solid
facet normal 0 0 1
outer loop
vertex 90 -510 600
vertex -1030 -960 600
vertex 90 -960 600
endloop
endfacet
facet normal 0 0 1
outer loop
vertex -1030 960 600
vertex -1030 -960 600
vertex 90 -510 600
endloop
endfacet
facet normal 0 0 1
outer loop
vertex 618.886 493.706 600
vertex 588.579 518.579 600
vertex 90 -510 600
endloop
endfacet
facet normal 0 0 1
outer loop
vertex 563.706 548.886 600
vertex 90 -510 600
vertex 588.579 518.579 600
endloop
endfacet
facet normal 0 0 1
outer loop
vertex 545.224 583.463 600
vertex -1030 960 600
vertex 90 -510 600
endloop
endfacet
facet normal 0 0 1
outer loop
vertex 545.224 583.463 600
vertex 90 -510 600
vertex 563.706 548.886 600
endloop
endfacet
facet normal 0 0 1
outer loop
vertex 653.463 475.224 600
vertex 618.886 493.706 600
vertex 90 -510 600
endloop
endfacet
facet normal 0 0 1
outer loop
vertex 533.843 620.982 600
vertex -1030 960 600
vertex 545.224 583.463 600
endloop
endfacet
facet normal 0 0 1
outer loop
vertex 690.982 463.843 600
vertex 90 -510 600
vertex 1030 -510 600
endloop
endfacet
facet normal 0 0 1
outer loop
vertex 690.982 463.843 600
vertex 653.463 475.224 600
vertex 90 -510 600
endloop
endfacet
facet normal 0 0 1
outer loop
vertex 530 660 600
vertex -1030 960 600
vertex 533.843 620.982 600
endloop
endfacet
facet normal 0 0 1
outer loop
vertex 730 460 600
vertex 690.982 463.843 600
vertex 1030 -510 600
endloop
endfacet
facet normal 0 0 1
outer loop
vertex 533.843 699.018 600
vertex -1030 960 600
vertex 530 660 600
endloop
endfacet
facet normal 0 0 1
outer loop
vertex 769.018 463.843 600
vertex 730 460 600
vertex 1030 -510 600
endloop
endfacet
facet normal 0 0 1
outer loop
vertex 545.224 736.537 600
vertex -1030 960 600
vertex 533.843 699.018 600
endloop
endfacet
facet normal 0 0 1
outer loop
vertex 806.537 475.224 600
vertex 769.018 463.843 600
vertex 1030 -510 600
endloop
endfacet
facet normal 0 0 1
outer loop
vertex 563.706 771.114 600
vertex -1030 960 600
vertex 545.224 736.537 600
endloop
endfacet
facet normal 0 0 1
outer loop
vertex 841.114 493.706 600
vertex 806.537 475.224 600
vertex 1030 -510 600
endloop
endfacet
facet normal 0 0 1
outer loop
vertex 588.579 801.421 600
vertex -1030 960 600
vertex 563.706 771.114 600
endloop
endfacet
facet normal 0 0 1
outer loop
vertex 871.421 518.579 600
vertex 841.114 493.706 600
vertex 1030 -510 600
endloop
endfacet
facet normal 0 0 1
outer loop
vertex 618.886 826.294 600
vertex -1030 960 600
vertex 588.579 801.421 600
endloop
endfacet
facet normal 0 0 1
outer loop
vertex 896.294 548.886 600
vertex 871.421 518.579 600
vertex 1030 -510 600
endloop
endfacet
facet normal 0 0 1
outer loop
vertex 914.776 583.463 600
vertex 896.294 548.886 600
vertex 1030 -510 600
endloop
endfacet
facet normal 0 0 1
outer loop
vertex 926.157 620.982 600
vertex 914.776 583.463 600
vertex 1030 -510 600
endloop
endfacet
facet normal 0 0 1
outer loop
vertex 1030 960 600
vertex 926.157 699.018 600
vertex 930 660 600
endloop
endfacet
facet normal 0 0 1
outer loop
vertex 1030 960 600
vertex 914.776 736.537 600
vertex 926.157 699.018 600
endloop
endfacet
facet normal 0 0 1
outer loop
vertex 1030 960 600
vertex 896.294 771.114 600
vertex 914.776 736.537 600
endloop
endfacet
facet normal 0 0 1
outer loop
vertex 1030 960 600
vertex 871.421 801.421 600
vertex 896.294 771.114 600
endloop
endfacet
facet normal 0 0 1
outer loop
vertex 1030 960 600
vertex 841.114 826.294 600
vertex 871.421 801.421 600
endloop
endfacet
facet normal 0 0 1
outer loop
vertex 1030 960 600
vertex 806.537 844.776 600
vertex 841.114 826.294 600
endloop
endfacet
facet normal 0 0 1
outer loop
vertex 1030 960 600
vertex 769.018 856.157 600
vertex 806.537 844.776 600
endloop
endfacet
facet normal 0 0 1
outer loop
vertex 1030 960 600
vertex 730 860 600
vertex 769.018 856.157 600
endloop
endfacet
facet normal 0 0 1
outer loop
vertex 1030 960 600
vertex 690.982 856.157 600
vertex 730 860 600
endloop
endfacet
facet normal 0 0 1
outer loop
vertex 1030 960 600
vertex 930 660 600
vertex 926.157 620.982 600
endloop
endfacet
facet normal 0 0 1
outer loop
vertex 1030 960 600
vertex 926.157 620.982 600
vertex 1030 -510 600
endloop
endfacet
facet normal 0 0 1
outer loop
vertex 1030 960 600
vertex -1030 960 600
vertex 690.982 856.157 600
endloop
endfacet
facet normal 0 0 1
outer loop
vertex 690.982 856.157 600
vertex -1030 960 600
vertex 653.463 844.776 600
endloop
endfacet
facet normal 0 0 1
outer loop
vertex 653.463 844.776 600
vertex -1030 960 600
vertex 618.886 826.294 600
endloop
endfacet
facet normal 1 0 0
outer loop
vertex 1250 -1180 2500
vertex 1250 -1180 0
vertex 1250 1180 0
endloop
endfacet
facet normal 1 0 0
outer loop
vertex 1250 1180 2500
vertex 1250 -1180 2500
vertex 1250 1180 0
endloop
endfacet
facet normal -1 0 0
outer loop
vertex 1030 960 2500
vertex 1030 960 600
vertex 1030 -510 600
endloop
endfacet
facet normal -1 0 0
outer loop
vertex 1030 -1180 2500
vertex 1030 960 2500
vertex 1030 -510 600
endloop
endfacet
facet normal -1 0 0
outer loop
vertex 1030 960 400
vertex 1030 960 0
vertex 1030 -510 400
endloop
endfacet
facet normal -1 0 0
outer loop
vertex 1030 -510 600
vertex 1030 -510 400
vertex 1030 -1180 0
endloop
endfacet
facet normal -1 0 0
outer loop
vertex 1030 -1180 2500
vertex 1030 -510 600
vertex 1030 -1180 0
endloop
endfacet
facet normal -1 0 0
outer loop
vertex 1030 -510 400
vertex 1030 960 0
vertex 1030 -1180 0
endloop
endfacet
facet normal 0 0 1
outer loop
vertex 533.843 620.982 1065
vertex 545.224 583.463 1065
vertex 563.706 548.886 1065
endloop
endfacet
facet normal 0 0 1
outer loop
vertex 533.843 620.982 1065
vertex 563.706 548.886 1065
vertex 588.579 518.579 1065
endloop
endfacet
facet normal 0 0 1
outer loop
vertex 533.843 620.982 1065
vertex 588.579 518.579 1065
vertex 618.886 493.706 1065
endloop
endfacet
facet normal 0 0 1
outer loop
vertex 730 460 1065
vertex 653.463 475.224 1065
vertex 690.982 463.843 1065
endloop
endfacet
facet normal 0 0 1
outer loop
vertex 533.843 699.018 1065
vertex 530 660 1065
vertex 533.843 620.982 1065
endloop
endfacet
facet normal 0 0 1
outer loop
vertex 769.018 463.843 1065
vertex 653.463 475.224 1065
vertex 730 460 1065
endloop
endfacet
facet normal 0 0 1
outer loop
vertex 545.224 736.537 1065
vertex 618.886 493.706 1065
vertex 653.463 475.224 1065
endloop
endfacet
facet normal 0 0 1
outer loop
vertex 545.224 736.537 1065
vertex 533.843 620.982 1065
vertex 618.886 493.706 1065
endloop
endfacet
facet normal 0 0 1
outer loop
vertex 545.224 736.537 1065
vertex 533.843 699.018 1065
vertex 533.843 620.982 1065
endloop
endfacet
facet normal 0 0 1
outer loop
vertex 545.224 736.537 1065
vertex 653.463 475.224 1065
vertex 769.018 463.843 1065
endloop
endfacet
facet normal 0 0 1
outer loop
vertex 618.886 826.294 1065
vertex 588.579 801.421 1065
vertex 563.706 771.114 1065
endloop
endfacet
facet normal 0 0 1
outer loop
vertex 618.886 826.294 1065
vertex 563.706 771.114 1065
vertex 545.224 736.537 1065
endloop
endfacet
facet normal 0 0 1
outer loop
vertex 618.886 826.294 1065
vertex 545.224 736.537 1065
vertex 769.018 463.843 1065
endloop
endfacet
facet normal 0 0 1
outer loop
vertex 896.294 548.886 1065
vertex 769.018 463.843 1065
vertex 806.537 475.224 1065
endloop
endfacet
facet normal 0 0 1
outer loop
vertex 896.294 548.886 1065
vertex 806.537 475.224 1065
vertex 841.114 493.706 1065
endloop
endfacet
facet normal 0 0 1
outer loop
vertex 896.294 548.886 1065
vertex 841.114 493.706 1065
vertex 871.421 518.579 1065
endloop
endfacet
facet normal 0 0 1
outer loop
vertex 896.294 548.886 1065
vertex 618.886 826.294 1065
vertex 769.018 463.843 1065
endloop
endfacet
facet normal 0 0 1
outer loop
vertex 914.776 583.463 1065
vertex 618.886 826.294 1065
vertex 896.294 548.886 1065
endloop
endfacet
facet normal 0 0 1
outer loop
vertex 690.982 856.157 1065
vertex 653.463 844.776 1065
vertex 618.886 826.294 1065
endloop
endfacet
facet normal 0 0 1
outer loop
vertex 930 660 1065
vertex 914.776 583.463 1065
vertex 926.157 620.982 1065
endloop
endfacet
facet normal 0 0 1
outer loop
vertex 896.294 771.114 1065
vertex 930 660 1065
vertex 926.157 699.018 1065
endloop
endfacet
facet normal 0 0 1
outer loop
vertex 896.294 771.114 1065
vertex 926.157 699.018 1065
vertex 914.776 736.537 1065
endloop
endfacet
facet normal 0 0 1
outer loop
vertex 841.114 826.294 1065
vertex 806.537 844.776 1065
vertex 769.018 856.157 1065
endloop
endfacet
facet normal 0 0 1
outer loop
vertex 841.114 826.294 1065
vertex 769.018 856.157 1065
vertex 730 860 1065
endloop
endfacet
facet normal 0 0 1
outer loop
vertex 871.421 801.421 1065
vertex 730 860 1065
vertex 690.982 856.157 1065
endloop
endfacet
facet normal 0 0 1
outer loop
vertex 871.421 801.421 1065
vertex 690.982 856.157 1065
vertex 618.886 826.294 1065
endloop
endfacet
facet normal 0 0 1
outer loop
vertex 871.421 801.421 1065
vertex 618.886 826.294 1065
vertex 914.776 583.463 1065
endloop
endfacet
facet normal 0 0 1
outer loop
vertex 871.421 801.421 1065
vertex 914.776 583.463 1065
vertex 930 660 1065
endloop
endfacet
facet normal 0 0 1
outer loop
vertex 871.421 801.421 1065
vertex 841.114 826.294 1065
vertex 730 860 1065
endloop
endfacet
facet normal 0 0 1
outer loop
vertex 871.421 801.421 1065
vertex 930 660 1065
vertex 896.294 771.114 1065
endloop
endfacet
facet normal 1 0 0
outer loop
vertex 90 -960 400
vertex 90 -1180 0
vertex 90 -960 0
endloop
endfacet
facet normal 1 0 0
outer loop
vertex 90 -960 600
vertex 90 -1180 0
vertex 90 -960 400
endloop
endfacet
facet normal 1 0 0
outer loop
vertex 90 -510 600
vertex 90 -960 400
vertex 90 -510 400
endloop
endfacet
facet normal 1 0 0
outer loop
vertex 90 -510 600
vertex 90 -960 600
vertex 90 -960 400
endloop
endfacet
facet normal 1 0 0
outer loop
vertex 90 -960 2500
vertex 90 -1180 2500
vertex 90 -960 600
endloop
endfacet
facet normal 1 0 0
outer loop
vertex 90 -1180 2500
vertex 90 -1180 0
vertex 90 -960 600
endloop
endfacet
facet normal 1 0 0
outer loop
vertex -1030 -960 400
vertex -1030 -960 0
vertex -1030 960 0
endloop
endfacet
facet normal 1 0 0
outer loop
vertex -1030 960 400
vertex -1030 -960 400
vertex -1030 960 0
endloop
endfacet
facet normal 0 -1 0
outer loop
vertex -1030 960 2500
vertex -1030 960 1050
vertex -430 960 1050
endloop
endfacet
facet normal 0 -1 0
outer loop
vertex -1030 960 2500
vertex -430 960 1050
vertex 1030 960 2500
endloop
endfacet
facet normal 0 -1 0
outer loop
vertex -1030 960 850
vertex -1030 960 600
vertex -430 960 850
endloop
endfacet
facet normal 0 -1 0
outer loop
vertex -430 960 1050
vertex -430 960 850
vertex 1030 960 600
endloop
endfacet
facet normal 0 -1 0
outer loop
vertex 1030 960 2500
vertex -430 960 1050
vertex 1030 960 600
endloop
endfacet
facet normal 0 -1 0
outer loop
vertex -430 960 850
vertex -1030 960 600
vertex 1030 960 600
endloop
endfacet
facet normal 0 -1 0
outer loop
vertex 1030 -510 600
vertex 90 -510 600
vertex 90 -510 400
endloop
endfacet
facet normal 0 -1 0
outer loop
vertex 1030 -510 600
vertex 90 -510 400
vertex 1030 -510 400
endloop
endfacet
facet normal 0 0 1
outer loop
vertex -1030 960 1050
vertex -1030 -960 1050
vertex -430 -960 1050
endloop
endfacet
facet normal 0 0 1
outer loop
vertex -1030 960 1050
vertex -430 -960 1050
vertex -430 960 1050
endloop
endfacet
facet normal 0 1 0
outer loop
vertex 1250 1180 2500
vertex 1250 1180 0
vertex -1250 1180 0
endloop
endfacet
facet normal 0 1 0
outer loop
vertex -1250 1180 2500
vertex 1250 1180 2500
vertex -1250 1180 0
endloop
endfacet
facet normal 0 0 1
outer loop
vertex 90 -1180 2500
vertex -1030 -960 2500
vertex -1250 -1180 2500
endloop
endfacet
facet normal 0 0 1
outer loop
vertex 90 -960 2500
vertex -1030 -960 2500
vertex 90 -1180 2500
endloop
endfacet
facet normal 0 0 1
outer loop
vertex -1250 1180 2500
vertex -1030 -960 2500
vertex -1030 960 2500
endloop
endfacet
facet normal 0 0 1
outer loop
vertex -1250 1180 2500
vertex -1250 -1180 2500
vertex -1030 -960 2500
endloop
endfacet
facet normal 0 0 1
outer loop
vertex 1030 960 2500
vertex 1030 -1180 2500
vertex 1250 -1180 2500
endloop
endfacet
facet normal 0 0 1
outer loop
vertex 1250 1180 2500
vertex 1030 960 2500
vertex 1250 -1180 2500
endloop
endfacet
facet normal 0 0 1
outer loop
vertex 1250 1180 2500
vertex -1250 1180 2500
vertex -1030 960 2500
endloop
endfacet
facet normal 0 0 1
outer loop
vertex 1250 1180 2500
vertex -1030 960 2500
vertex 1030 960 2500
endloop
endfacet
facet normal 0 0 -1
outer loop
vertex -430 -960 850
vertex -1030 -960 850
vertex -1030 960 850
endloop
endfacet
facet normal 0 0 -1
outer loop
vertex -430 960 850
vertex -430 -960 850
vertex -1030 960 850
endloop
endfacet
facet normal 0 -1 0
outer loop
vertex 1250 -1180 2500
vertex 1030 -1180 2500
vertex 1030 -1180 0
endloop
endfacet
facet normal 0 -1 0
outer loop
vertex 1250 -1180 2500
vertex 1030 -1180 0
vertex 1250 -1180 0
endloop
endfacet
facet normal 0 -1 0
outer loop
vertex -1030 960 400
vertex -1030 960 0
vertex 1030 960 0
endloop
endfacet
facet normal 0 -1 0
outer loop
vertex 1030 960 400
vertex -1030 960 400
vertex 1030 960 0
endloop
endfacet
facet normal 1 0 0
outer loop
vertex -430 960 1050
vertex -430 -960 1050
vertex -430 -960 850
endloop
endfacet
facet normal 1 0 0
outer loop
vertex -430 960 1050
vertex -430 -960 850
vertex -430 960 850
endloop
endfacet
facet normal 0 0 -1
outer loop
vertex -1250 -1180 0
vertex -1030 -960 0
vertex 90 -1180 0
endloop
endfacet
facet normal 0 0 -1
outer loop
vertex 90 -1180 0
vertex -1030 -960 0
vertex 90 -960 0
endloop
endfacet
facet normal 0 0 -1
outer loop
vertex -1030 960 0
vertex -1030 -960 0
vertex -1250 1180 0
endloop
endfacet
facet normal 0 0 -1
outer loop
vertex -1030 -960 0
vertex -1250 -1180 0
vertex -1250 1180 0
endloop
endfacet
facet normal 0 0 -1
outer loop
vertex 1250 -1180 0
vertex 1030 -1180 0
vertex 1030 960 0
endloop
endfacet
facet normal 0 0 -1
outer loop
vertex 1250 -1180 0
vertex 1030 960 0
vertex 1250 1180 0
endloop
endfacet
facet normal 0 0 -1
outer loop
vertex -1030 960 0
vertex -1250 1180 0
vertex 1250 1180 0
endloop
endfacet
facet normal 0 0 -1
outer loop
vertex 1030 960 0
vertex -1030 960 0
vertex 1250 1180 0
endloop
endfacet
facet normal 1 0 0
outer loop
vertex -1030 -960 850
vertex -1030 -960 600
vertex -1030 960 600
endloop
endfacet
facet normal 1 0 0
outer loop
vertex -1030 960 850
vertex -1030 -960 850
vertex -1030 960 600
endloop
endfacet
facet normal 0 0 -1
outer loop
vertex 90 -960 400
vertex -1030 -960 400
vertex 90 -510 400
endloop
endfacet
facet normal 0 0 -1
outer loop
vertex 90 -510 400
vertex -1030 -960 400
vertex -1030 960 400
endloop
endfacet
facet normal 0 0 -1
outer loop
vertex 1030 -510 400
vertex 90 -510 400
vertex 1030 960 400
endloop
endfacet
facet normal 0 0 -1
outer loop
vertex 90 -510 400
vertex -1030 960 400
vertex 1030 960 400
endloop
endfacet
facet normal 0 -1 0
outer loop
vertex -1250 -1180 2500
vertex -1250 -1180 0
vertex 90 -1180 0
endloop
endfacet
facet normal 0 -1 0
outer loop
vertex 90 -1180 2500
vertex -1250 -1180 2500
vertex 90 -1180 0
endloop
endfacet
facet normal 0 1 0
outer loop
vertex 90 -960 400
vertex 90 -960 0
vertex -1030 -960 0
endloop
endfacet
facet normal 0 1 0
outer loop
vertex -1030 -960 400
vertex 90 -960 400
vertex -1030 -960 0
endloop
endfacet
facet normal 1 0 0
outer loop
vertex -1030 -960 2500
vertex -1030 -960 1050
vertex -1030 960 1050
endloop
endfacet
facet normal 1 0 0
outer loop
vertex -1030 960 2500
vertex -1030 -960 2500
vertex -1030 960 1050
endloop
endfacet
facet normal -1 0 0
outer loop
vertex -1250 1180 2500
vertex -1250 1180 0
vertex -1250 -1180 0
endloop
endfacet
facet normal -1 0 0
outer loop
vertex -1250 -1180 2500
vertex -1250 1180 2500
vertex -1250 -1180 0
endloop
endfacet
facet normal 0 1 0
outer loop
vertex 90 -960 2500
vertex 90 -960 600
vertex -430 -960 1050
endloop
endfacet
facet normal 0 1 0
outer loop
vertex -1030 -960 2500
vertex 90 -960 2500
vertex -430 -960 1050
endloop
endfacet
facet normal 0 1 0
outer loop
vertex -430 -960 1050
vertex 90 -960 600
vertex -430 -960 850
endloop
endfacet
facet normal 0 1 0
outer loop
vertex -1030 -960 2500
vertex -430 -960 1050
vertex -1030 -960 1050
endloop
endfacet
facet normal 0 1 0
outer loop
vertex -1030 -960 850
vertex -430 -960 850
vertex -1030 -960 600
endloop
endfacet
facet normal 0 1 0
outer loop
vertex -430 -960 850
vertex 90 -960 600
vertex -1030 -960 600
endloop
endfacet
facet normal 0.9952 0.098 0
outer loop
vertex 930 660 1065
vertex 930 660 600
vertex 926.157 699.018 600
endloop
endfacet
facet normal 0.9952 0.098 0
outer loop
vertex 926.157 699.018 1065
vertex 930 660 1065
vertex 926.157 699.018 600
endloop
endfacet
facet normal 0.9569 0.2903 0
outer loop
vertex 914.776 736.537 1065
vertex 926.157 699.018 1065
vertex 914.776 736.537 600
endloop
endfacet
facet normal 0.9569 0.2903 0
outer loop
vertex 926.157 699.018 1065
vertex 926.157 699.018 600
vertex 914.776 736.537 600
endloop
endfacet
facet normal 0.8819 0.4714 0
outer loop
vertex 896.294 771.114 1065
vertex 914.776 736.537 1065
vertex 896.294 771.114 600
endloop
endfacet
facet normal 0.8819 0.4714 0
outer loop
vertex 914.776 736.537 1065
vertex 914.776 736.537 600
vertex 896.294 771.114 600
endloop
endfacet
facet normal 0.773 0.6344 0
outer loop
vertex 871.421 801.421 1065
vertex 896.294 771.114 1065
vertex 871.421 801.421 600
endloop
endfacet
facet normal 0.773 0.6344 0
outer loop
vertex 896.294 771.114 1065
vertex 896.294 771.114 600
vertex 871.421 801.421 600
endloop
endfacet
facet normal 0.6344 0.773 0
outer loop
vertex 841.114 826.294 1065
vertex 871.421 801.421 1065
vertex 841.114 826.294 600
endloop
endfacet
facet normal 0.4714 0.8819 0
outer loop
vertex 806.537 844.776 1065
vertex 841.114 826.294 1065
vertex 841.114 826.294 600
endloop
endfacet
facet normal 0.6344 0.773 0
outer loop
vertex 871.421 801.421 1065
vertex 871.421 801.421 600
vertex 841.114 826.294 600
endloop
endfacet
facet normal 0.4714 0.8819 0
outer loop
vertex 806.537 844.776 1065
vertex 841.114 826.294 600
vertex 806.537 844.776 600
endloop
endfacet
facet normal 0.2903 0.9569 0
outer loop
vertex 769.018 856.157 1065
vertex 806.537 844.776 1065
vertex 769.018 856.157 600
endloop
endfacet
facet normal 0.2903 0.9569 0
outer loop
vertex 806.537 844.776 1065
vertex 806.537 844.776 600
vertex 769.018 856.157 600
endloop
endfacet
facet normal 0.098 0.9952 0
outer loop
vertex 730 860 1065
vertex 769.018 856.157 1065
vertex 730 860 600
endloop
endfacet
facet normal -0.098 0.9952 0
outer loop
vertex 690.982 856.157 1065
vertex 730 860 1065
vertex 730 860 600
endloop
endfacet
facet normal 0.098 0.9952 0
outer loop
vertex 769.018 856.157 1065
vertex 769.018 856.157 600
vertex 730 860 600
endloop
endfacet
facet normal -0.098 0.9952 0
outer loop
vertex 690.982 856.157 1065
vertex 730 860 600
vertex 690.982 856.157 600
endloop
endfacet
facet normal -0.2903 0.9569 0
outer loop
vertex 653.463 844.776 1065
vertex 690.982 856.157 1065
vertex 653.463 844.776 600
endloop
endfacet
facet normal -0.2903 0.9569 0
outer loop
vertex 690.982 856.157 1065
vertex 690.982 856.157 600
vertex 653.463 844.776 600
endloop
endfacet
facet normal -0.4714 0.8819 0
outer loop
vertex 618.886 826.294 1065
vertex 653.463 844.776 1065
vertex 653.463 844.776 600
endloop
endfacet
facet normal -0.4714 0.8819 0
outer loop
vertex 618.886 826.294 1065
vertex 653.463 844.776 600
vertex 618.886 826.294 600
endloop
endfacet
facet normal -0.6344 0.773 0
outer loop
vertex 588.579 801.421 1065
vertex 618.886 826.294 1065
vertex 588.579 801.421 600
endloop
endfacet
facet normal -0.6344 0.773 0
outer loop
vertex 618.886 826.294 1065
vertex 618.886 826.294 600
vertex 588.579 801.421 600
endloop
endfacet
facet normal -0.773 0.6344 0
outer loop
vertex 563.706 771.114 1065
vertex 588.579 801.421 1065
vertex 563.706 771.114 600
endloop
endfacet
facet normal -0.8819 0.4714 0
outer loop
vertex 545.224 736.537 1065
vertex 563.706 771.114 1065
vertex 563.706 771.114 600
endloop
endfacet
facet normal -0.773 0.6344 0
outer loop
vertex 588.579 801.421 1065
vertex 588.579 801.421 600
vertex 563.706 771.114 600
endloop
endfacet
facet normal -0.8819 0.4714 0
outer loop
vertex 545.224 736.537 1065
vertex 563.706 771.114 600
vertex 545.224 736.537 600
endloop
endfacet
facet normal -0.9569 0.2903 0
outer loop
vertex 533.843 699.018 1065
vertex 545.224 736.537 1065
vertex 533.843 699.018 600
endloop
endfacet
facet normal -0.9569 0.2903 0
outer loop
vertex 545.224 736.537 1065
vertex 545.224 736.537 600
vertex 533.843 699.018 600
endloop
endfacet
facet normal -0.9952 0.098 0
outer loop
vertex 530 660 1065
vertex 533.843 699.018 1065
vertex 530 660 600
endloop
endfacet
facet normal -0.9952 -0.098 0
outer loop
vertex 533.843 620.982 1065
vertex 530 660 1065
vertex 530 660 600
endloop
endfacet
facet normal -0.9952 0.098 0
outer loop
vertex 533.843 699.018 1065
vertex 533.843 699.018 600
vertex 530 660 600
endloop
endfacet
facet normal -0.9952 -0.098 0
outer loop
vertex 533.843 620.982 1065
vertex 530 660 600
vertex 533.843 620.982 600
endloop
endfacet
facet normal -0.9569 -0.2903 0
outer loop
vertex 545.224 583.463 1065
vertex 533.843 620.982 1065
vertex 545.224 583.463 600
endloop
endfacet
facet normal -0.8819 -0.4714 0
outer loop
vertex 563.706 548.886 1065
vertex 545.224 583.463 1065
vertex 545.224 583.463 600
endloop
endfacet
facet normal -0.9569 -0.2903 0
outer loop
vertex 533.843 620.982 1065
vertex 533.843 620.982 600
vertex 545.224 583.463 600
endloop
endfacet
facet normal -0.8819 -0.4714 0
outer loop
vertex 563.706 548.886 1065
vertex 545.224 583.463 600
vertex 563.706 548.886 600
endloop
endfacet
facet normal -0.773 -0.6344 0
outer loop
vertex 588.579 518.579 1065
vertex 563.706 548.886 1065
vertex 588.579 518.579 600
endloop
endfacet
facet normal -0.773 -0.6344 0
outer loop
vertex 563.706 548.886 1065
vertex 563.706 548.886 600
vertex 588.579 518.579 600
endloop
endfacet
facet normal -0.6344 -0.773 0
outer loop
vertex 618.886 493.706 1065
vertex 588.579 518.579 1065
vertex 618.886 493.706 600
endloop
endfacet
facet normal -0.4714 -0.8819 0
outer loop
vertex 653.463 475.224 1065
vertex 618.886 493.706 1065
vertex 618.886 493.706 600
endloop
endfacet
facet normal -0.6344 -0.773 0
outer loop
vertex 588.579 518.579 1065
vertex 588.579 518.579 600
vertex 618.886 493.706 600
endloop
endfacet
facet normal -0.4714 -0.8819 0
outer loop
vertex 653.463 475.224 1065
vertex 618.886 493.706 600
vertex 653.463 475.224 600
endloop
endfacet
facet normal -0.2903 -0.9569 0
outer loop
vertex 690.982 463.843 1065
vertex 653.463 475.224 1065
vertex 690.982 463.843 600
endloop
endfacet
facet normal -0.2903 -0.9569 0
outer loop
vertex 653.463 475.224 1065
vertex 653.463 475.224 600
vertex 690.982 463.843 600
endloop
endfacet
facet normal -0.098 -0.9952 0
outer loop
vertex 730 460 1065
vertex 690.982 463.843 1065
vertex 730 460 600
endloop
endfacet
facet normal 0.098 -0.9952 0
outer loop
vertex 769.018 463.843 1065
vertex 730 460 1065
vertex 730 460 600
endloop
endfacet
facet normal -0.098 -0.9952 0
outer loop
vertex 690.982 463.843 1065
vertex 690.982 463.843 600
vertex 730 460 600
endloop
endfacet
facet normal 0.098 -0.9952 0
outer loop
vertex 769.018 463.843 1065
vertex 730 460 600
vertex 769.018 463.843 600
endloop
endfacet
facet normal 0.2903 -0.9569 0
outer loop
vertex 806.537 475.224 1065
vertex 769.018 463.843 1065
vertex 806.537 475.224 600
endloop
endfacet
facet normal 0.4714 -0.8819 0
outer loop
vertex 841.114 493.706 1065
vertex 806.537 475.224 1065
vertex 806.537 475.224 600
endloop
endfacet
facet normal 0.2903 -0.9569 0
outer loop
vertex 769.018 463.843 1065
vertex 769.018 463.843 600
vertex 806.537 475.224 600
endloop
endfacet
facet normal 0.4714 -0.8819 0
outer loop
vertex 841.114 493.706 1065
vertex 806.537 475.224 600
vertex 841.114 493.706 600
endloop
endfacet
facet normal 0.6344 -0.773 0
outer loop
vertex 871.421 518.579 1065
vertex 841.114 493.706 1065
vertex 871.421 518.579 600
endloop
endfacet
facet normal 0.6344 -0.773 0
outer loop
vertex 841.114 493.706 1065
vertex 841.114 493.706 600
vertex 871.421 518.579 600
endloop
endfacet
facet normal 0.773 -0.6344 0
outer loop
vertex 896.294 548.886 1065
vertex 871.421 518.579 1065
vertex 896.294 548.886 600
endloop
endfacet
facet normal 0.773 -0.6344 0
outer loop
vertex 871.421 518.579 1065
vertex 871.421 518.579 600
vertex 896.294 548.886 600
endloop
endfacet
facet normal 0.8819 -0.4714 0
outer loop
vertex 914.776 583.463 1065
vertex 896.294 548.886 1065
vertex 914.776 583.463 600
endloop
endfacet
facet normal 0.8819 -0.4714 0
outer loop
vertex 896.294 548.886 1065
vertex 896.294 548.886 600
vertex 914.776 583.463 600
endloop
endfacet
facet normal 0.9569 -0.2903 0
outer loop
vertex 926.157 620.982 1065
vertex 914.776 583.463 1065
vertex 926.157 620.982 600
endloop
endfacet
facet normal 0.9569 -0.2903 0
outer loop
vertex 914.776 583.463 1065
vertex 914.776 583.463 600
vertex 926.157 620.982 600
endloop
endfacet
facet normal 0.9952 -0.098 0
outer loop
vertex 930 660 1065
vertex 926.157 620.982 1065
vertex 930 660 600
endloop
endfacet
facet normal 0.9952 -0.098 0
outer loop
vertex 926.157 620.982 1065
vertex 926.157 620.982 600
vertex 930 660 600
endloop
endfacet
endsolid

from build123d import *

# Parameters (mm, degrees)
F1_DEPTH = 2500
F2_W     = 2060
F2_H     = 200
F3_DEPTH = 1920
F4_W     = 1920
F4_H     = 200
F5_DEPTH = 600
F6_R     = 200
F7_DEPTH = 465
F8_W     = 940
F8_H     = 450
F9_DEPTH = 200


# Not quite as in the source:
# - the program builds the solid bodies; features that only make, move or delete a surface that nothing else refers to are left out


with BuildPart() as f1:
    # F0 (on Top) → F1 (new body)
    with BuildSketch(Plane.XY):
        Polygon((-1030, 960), (1030, 960), (1030, -960), (1030, -1180), (1250, -1180), (1250, 1180), (-1250, 1180), (-1250, -1180), (90, -1180), (90, -960), (-1030, -960), align=None)
    extrude(amount=F1_DEPTH)

    # F2 (on face) → F3 (join)
    with BuildSketch(Plane.XZ.offset(-960)):
        with Locations((0, 500)):
            Rectangle(F2_W, F2_H)
    extrude(amount=F3_DEPTH)

    # F4 (on face) → F5 (join)
    with BuildSketch(Plane.YZ.offset(-1030)):
        with Locations((0, 950)):
            Rectangle(F4_W, F4_H)
    extrude(amount=F5_DEPTH)

    # F6 (on face) → F7 (join)
    with BuildSketch(Plane.XY.offset(600)):
        with Locations((730, 660)):
            Circle(F6_R)
    extrude(amount=F7_DEPTH)

    # F8 (on face) → F9 (cut, through all)
    with BuildSketch(Plane.XY.offset(600)):
        with Locations((560, -735)):
            Rectangle(F8_W, F8_H)
    extrude(amount=-F9_DEPTH, mode=Mode.SUBTRACT)


solid = f1.part
